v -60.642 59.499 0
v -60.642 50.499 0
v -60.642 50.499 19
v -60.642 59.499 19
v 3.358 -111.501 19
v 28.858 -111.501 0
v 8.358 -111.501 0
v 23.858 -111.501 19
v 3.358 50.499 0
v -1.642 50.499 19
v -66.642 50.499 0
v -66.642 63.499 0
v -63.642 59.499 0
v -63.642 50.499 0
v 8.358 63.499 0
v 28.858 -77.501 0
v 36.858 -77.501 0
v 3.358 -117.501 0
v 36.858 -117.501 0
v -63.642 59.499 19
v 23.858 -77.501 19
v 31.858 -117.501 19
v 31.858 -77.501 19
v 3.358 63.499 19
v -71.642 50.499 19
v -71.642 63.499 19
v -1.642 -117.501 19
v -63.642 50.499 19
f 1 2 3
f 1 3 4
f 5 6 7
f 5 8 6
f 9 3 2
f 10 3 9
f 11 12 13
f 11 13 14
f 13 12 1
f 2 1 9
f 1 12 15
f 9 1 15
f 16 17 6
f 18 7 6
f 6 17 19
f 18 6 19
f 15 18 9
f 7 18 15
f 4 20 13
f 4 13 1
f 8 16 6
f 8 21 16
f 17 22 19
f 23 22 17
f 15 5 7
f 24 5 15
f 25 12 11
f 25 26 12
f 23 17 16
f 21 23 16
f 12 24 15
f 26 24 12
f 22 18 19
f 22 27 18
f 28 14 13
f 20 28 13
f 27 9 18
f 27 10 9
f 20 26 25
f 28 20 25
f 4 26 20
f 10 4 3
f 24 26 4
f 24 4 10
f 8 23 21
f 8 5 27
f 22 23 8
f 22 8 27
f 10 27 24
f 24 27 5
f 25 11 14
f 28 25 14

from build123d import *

# Parameters (mm, degrees)
F4_W     = 3
F4_H     = 9
F5_DEPTH = 25


with BuildPart() as f3:
    # F0 (on Top) → F3 section 0
    with BuildSketch(Plane.XY):
        Polygon((-66.641917, 50.499433), (-56.641917, 50.499433), (3.358083, 50.499433), (3.358083, -117.500567), (36.858083, -117.500567), (36.858083, -77.500567), (28.858083, -77.500567), (28.858083, -111.500567), (8.358083, -111.500567), (8.358083, 63.499433), (-66.641917, 63.499433), align=None)
    # F2 (on offset) → F3 section 1
    with BuildSketch(Plane.XY.offset(19)):
        Polygon((-71.641917, 50.499433), (-61.641917, 50.499433), (-1.641917, 50.499433), (-1.641917, -117.500567), (31.858083, -117.500567), (31.858083, -77.500567), (23.858083, -77.500567), (23.858083, -111.500567), (3.358083, -111.500567), (3.358083, 63.499433), (-71.641917, 63.499433), align=None)
    loft()

    # F4 (on face) → F5 (cut)
    with BuildSketch(Plane.XY.offset(19)):
        with Locations((-62.141917, 54.999433)):
            Rectangle(F4_W, F4_H)
    extrude(amount=-F5_DEPTH, mode=Mode.SUBTRACT)


solid = f3.part
